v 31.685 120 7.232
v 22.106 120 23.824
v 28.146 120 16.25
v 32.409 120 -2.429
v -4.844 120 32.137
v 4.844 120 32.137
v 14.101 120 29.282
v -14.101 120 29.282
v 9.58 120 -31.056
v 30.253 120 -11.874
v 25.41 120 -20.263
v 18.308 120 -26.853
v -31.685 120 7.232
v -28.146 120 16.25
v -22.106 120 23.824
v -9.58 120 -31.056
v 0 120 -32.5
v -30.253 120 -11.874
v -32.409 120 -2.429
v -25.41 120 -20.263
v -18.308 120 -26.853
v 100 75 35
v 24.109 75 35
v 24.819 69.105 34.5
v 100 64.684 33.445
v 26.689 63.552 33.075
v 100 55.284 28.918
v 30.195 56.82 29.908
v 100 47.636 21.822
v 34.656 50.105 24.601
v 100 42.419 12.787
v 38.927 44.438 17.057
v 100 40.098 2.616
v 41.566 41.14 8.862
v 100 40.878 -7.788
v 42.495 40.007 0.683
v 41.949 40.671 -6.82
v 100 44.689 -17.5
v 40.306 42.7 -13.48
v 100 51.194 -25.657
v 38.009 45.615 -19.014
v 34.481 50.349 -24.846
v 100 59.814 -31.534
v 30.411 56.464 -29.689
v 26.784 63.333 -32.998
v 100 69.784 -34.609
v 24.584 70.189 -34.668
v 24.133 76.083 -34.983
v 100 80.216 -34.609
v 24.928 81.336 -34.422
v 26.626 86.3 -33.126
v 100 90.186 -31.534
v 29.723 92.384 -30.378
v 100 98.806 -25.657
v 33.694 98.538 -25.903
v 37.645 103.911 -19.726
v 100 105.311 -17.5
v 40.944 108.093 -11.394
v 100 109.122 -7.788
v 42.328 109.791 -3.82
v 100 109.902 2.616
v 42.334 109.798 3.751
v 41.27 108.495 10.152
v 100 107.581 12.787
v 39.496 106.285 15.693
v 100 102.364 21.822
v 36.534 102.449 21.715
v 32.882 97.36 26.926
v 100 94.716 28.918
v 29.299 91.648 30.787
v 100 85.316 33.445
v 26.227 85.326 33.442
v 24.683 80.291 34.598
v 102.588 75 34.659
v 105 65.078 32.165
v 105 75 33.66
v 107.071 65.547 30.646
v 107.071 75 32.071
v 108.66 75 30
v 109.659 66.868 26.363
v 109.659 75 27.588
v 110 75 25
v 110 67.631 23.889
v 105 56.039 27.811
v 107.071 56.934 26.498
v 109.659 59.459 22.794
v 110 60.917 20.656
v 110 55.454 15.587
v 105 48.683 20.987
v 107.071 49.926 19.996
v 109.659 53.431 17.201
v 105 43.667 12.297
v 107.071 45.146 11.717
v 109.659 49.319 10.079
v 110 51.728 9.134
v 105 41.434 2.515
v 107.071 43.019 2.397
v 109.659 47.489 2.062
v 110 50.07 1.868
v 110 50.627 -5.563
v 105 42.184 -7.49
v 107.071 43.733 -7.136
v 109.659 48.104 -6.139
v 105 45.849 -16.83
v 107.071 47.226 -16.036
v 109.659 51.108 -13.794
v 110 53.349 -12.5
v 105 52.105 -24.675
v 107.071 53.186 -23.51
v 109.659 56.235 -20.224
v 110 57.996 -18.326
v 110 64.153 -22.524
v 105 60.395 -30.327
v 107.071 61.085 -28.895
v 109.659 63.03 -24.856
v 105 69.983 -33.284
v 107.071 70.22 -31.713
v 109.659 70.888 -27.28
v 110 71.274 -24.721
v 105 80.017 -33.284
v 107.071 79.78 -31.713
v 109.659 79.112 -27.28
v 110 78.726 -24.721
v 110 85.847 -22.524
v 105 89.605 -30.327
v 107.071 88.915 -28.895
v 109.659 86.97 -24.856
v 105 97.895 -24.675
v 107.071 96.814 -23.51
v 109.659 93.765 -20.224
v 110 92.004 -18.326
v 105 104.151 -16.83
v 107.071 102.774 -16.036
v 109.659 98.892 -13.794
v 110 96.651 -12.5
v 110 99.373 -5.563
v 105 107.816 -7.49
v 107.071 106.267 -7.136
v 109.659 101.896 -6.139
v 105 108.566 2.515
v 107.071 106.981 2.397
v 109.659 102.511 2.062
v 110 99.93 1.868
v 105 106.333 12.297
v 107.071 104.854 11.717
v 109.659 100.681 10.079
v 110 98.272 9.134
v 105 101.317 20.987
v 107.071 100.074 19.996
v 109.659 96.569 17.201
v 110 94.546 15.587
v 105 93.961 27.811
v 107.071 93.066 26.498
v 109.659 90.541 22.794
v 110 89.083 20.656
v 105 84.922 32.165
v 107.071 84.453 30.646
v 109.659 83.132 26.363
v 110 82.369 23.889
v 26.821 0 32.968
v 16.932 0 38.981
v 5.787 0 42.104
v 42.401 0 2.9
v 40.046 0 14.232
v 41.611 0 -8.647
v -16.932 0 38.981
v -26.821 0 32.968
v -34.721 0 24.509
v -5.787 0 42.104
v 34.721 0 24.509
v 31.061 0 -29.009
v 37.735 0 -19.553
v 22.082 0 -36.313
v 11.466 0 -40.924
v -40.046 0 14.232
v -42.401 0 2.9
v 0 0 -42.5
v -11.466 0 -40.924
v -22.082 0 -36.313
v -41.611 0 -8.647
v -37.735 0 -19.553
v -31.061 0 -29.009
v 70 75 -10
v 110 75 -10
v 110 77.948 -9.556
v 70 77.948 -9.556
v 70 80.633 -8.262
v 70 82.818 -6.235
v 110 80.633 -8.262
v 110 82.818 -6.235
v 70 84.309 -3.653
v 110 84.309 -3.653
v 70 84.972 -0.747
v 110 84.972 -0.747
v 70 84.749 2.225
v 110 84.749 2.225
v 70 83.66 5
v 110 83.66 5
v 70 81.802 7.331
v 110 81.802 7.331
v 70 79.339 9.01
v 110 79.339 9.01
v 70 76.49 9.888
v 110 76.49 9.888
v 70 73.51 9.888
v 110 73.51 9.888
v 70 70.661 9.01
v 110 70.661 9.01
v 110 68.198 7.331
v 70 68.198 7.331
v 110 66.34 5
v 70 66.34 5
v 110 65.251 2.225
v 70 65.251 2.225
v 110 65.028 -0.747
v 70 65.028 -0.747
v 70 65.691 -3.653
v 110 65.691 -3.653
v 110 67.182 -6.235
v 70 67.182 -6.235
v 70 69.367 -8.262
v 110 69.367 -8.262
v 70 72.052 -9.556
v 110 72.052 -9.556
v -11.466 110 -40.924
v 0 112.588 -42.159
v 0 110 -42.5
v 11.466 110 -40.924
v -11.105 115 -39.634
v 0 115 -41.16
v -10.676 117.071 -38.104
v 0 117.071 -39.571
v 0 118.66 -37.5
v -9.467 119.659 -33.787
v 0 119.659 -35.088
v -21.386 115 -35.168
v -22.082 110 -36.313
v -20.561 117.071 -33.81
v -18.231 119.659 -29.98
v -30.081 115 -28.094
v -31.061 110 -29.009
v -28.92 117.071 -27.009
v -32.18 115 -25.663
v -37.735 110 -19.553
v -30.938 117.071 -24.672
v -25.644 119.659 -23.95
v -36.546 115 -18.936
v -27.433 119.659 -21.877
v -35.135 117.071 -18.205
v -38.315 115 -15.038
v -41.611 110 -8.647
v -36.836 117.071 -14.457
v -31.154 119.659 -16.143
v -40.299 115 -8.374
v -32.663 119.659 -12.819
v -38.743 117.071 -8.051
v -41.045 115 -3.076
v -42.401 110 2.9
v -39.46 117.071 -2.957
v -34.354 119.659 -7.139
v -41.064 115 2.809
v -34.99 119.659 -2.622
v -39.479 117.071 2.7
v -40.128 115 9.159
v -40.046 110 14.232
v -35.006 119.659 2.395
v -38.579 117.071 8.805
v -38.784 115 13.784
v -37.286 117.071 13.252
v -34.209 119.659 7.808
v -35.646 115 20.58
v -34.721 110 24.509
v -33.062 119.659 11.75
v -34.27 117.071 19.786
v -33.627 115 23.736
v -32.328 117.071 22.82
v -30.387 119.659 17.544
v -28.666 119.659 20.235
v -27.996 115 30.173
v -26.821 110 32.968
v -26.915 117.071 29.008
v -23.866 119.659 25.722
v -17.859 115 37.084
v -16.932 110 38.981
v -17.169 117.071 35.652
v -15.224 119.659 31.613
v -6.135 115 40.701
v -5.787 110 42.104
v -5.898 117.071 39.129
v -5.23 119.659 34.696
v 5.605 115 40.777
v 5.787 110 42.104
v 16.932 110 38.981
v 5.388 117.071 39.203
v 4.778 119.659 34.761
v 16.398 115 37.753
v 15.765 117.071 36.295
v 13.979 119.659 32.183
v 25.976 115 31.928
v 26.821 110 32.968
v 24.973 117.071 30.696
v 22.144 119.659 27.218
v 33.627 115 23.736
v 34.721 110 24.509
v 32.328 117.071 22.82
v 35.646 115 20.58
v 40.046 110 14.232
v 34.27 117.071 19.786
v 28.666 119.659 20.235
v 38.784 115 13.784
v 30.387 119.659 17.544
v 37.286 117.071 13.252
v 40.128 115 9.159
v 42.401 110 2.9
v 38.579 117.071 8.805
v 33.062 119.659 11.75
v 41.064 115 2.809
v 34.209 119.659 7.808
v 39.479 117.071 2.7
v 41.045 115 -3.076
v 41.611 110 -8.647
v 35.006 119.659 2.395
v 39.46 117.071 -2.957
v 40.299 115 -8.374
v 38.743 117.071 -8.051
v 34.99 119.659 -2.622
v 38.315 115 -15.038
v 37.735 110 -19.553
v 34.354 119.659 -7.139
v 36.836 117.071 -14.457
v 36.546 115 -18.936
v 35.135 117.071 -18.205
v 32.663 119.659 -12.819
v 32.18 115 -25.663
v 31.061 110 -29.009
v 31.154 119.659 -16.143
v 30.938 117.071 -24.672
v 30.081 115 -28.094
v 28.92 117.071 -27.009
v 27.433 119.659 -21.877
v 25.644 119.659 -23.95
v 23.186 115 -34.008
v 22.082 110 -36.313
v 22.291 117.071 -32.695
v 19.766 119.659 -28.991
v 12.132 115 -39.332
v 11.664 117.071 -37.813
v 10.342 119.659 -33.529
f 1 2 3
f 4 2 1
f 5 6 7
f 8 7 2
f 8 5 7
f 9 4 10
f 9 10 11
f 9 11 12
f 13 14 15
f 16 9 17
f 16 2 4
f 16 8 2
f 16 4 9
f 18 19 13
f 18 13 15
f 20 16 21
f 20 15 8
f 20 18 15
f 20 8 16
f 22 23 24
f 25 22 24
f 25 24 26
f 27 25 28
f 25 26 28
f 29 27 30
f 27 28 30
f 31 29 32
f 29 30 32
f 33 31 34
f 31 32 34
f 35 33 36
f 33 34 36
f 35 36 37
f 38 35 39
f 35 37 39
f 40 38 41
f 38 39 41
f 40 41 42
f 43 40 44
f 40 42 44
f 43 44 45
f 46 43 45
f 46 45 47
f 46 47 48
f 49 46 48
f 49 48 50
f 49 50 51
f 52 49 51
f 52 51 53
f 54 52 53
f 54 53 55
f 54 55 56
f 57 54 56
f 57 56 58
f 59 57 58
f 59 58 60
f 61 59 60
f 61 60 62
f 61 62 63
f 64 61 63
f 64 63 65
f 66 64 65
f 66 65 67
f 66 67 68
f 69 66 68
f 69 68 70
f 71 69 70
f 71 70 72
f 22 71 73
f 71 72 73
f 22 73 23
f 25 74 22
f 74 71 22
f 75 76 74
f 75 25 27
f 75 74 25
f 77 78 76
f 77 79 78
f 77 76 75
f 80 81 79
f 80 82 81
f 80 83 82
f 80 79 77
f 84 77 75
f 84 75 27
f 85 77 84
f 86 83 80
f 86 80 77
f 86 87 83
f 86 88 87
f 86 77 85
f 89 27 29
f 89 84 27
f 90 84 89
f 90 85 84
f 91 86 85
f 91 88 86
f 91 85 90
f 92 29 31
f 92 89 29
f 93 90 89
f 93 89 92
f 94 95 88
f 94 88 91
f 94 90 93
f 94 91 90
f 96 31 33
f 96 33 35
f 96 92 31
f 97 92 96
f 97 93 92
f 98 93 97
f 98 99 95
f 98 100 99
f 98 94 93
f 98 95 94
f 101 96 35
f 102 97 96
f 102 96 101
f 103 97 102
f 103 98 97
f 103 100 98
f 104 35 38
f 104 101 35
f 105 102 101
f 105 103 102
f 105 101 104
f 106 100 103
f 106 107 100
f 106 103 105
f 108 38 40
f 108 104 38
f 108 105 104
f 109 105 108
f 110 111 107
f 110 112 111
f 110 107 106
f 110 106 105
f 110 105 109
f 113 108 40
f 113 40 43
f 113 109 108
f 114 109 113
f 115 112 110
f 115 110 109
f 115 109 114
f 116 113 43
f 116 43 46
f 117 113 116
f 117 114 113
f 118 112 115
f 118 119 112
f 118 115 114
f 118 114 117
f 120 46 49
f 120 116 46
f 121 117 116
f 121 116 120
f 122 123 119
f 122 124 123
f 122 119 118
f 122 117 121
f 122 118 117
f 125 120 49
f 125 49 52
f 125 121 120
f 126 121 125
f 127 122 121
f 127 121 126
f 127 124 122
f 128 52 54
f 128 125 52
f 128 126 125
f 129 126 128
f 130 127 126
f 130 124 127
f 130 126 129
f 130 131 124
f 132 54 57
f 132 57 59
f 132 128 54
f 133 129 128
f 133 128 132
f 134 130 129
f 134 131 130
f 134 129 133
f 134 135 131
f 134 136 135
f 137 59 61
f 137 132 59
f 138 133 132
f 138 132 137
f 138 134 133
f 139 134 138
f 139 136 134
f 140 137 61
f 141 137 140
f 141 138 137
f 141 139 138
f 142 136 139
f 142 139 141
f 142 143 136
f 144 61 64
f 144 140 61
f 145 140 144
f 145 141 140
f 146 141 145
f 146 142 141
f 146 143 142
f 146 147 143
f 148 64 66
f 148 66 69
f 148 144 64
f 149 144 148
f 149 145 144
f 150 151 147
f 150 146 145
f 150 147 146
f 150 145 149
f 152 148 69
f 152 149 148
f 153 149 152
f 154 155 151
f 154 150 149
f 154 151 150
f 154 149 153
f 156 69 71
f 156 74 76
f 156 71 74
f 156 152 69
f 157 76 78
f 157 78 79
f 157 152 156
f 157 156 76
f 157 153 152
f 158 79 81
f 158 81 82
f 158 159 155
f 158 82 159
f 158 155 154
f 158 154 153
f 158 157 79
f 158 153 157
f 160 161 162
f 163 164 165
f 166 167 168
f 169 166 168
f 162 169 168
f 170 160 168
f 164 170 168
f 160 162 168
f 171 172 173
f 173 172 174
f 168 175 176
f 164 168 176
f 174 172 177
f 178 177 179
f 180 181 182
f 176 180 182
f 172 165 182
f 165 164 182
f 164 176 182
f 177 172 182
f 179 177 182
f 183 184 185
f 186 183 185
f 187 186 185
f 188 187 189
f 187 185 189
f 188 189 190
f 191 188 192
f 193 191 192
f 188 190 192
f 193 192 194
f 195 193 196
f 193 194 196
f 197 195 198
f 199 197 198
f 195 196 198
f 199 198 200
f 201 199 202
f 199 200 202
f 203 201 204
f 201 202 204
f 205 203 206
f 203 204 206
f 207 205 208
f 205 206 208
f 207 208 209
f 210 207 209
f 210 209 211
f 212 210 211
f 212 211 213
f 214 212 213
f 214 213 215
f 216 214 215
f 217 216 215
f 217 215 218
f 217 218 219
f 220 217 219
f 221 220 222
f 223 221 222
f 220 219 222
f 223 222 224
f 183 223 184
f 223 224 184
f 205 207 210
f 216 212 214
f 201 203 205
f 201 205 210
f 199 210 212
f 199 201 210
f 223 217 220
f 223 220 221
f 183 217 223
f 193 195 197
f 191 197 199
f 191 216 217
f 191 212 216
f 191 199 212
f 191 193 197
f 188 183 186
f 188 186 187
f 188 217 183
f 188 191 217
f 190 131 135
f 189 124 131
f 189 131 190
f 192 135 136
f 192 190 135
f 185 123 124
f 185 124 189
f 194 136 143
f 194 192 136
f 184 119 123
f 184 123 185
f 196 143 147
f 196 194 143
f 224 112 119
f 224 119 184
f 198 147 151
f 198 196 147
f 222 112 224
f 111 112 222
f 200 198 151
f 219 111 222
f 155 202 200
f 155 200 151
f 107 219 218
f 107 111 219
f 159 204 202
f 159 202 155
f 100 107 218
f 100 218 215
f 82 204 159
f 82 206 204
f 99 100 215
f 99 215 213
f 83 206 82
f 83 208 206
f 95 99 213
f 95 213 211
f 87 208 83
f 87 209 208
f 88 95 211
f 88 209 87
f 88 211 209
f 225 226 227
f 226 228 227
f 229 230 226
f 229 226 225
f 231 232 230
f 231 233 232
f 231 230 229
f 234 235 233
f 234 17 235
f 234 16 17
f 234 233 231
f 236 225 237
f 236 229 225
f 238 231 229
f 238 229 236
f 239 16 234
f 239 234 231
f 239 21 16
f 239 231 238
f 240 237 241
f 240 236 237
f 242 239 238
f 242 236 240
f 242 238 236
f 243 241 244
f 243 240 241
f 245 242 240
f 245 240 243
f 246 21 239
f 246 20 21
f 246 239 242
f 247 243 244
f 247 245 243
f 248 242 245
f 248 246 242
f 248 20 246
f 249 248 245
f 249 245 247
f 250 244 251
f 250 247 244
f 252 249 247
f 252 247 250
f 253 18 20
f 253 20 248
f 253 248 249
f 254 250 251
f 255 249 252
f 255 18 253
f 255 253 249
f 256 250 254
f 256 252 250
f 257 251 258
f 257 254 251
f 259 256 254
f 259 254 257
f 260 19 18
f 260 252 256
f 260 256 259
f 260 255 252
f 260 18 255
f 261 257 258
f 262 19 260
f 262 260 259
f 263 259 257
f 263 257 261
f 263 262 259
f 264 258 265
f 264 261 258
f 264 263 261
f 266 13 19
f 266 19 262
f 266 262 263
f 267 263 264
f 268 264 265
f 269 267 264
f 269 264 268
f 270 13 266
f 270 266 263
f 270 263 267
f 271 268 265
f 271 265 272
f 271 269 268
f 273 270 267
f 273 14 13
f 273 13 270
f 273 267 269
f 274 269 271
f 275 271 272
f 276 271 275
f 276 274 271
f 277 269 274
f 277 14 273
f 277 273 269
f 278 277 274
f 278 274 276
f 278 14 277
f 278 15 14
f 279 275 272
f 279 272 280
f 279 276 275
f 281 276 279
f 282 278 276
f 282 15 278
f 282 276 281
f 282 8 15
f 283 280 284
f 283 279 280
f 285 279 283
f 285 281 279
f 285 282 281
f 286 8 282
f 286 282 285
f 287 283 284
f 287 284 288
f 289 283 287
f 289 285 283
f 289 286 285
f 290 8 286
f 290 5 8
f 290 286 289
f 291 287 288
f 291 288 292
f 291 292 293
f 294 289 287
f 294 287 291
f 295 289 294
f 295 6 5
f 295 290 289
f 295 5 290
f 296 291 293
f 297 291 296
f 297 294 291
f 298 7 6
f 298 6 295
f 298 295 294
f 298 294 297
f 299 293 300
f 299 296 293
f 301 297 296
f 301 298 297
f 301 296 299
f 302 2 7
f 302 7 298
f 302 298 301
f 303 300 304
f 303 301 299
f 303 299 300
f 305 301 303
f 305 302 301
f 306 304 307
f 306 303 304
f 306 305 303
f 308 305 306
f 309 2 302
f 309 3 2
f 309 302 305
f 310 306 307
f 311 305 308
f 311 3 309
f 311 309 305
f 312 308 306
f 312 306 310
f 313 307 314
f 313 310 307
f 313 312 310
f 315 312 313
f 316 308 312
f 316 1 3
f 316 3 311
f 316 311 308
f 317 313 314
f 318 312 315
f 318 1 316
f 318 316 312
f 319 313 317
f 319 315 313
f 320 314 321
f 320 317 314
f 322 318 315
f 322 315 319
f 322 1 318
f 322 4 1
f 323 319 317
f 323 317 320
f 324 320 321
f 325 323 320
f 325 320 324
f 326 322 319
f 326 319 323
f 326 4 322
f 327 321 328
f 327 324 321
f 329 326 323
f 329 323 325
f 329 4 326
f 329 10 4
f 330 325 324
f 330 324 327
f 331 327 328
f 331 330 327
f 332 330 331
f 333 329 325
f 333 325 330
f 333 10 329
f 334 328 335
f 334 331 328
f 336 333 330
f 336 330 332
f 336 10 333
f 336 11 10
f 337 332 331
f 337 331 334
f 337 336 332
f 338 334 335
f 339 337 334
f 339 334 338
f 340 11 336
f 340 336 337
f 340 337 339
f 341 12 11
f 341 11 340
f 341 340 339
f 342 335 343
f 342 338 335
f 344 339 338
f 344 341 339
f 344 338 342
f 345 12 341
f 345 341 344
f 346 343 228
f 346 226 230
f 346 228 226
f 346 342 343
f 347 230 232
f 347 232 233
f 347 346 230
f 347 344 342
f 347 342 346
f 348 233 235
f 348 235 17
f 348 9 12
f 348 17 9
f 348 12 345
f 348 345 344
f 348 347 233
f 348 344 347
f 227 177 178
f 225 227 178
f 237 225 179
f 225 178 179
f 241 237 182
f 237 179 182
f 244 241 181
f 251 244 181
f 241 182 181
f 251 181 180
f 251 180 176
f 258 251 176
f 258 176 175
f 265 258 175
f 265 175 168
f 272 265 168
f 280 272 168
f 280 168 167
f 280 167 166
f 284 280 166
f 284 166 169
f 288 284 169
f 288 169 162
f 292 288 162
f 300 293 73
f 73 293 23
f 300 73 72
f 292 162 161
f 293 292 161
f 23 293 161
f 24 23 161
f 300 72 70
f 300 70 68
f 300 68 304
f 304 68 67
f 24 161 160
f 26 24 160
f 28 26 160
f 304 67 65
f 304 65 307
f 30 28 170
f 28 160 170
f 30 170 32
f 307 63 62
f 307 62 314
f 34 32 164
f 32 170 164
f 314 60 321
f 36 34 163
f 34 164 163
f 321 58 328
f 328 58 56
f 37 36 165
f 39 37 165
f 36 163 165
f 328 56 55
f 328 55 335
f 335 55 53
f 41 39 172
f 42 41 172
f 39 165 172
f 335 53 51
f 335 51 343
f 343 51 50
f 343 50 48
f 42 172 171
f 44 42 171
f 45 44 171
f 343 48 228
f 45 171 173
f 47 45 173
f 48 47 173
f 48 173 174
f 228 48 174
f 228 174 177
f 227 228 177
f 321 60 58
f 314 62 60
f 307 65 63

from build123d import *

# Parameters (mm, degrees)
SKETCH1_R           = 42.5
BOSS_EXTRUDE1_DEPTH = 120
SKETCH2_R           = 35
BOSS_EXTRUDE2_DEPTH = 110
FILLET1_R           = 10
SKETCH3_R           = 10
CUT_EXTRUDE1_DEPTH  = 40
FILLET2_R           = 10


with BuildPart() as part:
    # Sketch1 → Boss-Extrude1 (new body)
    with BuildSketch(Plane(origin=(0, 0, 0), x_dir=(1, 0, 0), z_dir=(0, 1, 0))):
        Circle(SKETCH1_R)
    extrude(amount=BOSS_EXTRUDE1_DEPTH)

    # Sketch2 → Boss-Extrude2 (add)
    with BuildSketch(Plane(origin=(0, 0, 0), x_dir=(0, 0, -1), z_dir=(1, 0, 0))):
        with Locations((0, 75)):
            Circle(SKETCH2_R)
    extrude(amount=BOSS_EXTRUDE2_DEPTH)

    # Fillet1
    fillet1_edges = [part.edges().sort_by_distance(p)[0] for p in [
        (-42.5, 120, 0),
    ]]
    fillet(fillet1_edges, radius=FILLET1_R)

    # Sketch3 → Cut-Extrude1 (cut)
    with BuildSketch(Plane(origin=(110, 0, 0), x_dir=(0, 0, -1), z_dir=(1, 0, 0))):
        with Locations((0, 75)):
            Circle(SKETCH3_R)
    extrude(amount=-CUT_EXTRUDE1_DEPTH, mode=Mode.SUBTRACT)

    # Fillet2
    fillet2_edges = [part.edges().sort_by_distance(p)[0] for p in [
        (110, 75, 35),
    ]]
    fillet(fillet2_edges, radius=FILLET2_R)


solid = part.part
